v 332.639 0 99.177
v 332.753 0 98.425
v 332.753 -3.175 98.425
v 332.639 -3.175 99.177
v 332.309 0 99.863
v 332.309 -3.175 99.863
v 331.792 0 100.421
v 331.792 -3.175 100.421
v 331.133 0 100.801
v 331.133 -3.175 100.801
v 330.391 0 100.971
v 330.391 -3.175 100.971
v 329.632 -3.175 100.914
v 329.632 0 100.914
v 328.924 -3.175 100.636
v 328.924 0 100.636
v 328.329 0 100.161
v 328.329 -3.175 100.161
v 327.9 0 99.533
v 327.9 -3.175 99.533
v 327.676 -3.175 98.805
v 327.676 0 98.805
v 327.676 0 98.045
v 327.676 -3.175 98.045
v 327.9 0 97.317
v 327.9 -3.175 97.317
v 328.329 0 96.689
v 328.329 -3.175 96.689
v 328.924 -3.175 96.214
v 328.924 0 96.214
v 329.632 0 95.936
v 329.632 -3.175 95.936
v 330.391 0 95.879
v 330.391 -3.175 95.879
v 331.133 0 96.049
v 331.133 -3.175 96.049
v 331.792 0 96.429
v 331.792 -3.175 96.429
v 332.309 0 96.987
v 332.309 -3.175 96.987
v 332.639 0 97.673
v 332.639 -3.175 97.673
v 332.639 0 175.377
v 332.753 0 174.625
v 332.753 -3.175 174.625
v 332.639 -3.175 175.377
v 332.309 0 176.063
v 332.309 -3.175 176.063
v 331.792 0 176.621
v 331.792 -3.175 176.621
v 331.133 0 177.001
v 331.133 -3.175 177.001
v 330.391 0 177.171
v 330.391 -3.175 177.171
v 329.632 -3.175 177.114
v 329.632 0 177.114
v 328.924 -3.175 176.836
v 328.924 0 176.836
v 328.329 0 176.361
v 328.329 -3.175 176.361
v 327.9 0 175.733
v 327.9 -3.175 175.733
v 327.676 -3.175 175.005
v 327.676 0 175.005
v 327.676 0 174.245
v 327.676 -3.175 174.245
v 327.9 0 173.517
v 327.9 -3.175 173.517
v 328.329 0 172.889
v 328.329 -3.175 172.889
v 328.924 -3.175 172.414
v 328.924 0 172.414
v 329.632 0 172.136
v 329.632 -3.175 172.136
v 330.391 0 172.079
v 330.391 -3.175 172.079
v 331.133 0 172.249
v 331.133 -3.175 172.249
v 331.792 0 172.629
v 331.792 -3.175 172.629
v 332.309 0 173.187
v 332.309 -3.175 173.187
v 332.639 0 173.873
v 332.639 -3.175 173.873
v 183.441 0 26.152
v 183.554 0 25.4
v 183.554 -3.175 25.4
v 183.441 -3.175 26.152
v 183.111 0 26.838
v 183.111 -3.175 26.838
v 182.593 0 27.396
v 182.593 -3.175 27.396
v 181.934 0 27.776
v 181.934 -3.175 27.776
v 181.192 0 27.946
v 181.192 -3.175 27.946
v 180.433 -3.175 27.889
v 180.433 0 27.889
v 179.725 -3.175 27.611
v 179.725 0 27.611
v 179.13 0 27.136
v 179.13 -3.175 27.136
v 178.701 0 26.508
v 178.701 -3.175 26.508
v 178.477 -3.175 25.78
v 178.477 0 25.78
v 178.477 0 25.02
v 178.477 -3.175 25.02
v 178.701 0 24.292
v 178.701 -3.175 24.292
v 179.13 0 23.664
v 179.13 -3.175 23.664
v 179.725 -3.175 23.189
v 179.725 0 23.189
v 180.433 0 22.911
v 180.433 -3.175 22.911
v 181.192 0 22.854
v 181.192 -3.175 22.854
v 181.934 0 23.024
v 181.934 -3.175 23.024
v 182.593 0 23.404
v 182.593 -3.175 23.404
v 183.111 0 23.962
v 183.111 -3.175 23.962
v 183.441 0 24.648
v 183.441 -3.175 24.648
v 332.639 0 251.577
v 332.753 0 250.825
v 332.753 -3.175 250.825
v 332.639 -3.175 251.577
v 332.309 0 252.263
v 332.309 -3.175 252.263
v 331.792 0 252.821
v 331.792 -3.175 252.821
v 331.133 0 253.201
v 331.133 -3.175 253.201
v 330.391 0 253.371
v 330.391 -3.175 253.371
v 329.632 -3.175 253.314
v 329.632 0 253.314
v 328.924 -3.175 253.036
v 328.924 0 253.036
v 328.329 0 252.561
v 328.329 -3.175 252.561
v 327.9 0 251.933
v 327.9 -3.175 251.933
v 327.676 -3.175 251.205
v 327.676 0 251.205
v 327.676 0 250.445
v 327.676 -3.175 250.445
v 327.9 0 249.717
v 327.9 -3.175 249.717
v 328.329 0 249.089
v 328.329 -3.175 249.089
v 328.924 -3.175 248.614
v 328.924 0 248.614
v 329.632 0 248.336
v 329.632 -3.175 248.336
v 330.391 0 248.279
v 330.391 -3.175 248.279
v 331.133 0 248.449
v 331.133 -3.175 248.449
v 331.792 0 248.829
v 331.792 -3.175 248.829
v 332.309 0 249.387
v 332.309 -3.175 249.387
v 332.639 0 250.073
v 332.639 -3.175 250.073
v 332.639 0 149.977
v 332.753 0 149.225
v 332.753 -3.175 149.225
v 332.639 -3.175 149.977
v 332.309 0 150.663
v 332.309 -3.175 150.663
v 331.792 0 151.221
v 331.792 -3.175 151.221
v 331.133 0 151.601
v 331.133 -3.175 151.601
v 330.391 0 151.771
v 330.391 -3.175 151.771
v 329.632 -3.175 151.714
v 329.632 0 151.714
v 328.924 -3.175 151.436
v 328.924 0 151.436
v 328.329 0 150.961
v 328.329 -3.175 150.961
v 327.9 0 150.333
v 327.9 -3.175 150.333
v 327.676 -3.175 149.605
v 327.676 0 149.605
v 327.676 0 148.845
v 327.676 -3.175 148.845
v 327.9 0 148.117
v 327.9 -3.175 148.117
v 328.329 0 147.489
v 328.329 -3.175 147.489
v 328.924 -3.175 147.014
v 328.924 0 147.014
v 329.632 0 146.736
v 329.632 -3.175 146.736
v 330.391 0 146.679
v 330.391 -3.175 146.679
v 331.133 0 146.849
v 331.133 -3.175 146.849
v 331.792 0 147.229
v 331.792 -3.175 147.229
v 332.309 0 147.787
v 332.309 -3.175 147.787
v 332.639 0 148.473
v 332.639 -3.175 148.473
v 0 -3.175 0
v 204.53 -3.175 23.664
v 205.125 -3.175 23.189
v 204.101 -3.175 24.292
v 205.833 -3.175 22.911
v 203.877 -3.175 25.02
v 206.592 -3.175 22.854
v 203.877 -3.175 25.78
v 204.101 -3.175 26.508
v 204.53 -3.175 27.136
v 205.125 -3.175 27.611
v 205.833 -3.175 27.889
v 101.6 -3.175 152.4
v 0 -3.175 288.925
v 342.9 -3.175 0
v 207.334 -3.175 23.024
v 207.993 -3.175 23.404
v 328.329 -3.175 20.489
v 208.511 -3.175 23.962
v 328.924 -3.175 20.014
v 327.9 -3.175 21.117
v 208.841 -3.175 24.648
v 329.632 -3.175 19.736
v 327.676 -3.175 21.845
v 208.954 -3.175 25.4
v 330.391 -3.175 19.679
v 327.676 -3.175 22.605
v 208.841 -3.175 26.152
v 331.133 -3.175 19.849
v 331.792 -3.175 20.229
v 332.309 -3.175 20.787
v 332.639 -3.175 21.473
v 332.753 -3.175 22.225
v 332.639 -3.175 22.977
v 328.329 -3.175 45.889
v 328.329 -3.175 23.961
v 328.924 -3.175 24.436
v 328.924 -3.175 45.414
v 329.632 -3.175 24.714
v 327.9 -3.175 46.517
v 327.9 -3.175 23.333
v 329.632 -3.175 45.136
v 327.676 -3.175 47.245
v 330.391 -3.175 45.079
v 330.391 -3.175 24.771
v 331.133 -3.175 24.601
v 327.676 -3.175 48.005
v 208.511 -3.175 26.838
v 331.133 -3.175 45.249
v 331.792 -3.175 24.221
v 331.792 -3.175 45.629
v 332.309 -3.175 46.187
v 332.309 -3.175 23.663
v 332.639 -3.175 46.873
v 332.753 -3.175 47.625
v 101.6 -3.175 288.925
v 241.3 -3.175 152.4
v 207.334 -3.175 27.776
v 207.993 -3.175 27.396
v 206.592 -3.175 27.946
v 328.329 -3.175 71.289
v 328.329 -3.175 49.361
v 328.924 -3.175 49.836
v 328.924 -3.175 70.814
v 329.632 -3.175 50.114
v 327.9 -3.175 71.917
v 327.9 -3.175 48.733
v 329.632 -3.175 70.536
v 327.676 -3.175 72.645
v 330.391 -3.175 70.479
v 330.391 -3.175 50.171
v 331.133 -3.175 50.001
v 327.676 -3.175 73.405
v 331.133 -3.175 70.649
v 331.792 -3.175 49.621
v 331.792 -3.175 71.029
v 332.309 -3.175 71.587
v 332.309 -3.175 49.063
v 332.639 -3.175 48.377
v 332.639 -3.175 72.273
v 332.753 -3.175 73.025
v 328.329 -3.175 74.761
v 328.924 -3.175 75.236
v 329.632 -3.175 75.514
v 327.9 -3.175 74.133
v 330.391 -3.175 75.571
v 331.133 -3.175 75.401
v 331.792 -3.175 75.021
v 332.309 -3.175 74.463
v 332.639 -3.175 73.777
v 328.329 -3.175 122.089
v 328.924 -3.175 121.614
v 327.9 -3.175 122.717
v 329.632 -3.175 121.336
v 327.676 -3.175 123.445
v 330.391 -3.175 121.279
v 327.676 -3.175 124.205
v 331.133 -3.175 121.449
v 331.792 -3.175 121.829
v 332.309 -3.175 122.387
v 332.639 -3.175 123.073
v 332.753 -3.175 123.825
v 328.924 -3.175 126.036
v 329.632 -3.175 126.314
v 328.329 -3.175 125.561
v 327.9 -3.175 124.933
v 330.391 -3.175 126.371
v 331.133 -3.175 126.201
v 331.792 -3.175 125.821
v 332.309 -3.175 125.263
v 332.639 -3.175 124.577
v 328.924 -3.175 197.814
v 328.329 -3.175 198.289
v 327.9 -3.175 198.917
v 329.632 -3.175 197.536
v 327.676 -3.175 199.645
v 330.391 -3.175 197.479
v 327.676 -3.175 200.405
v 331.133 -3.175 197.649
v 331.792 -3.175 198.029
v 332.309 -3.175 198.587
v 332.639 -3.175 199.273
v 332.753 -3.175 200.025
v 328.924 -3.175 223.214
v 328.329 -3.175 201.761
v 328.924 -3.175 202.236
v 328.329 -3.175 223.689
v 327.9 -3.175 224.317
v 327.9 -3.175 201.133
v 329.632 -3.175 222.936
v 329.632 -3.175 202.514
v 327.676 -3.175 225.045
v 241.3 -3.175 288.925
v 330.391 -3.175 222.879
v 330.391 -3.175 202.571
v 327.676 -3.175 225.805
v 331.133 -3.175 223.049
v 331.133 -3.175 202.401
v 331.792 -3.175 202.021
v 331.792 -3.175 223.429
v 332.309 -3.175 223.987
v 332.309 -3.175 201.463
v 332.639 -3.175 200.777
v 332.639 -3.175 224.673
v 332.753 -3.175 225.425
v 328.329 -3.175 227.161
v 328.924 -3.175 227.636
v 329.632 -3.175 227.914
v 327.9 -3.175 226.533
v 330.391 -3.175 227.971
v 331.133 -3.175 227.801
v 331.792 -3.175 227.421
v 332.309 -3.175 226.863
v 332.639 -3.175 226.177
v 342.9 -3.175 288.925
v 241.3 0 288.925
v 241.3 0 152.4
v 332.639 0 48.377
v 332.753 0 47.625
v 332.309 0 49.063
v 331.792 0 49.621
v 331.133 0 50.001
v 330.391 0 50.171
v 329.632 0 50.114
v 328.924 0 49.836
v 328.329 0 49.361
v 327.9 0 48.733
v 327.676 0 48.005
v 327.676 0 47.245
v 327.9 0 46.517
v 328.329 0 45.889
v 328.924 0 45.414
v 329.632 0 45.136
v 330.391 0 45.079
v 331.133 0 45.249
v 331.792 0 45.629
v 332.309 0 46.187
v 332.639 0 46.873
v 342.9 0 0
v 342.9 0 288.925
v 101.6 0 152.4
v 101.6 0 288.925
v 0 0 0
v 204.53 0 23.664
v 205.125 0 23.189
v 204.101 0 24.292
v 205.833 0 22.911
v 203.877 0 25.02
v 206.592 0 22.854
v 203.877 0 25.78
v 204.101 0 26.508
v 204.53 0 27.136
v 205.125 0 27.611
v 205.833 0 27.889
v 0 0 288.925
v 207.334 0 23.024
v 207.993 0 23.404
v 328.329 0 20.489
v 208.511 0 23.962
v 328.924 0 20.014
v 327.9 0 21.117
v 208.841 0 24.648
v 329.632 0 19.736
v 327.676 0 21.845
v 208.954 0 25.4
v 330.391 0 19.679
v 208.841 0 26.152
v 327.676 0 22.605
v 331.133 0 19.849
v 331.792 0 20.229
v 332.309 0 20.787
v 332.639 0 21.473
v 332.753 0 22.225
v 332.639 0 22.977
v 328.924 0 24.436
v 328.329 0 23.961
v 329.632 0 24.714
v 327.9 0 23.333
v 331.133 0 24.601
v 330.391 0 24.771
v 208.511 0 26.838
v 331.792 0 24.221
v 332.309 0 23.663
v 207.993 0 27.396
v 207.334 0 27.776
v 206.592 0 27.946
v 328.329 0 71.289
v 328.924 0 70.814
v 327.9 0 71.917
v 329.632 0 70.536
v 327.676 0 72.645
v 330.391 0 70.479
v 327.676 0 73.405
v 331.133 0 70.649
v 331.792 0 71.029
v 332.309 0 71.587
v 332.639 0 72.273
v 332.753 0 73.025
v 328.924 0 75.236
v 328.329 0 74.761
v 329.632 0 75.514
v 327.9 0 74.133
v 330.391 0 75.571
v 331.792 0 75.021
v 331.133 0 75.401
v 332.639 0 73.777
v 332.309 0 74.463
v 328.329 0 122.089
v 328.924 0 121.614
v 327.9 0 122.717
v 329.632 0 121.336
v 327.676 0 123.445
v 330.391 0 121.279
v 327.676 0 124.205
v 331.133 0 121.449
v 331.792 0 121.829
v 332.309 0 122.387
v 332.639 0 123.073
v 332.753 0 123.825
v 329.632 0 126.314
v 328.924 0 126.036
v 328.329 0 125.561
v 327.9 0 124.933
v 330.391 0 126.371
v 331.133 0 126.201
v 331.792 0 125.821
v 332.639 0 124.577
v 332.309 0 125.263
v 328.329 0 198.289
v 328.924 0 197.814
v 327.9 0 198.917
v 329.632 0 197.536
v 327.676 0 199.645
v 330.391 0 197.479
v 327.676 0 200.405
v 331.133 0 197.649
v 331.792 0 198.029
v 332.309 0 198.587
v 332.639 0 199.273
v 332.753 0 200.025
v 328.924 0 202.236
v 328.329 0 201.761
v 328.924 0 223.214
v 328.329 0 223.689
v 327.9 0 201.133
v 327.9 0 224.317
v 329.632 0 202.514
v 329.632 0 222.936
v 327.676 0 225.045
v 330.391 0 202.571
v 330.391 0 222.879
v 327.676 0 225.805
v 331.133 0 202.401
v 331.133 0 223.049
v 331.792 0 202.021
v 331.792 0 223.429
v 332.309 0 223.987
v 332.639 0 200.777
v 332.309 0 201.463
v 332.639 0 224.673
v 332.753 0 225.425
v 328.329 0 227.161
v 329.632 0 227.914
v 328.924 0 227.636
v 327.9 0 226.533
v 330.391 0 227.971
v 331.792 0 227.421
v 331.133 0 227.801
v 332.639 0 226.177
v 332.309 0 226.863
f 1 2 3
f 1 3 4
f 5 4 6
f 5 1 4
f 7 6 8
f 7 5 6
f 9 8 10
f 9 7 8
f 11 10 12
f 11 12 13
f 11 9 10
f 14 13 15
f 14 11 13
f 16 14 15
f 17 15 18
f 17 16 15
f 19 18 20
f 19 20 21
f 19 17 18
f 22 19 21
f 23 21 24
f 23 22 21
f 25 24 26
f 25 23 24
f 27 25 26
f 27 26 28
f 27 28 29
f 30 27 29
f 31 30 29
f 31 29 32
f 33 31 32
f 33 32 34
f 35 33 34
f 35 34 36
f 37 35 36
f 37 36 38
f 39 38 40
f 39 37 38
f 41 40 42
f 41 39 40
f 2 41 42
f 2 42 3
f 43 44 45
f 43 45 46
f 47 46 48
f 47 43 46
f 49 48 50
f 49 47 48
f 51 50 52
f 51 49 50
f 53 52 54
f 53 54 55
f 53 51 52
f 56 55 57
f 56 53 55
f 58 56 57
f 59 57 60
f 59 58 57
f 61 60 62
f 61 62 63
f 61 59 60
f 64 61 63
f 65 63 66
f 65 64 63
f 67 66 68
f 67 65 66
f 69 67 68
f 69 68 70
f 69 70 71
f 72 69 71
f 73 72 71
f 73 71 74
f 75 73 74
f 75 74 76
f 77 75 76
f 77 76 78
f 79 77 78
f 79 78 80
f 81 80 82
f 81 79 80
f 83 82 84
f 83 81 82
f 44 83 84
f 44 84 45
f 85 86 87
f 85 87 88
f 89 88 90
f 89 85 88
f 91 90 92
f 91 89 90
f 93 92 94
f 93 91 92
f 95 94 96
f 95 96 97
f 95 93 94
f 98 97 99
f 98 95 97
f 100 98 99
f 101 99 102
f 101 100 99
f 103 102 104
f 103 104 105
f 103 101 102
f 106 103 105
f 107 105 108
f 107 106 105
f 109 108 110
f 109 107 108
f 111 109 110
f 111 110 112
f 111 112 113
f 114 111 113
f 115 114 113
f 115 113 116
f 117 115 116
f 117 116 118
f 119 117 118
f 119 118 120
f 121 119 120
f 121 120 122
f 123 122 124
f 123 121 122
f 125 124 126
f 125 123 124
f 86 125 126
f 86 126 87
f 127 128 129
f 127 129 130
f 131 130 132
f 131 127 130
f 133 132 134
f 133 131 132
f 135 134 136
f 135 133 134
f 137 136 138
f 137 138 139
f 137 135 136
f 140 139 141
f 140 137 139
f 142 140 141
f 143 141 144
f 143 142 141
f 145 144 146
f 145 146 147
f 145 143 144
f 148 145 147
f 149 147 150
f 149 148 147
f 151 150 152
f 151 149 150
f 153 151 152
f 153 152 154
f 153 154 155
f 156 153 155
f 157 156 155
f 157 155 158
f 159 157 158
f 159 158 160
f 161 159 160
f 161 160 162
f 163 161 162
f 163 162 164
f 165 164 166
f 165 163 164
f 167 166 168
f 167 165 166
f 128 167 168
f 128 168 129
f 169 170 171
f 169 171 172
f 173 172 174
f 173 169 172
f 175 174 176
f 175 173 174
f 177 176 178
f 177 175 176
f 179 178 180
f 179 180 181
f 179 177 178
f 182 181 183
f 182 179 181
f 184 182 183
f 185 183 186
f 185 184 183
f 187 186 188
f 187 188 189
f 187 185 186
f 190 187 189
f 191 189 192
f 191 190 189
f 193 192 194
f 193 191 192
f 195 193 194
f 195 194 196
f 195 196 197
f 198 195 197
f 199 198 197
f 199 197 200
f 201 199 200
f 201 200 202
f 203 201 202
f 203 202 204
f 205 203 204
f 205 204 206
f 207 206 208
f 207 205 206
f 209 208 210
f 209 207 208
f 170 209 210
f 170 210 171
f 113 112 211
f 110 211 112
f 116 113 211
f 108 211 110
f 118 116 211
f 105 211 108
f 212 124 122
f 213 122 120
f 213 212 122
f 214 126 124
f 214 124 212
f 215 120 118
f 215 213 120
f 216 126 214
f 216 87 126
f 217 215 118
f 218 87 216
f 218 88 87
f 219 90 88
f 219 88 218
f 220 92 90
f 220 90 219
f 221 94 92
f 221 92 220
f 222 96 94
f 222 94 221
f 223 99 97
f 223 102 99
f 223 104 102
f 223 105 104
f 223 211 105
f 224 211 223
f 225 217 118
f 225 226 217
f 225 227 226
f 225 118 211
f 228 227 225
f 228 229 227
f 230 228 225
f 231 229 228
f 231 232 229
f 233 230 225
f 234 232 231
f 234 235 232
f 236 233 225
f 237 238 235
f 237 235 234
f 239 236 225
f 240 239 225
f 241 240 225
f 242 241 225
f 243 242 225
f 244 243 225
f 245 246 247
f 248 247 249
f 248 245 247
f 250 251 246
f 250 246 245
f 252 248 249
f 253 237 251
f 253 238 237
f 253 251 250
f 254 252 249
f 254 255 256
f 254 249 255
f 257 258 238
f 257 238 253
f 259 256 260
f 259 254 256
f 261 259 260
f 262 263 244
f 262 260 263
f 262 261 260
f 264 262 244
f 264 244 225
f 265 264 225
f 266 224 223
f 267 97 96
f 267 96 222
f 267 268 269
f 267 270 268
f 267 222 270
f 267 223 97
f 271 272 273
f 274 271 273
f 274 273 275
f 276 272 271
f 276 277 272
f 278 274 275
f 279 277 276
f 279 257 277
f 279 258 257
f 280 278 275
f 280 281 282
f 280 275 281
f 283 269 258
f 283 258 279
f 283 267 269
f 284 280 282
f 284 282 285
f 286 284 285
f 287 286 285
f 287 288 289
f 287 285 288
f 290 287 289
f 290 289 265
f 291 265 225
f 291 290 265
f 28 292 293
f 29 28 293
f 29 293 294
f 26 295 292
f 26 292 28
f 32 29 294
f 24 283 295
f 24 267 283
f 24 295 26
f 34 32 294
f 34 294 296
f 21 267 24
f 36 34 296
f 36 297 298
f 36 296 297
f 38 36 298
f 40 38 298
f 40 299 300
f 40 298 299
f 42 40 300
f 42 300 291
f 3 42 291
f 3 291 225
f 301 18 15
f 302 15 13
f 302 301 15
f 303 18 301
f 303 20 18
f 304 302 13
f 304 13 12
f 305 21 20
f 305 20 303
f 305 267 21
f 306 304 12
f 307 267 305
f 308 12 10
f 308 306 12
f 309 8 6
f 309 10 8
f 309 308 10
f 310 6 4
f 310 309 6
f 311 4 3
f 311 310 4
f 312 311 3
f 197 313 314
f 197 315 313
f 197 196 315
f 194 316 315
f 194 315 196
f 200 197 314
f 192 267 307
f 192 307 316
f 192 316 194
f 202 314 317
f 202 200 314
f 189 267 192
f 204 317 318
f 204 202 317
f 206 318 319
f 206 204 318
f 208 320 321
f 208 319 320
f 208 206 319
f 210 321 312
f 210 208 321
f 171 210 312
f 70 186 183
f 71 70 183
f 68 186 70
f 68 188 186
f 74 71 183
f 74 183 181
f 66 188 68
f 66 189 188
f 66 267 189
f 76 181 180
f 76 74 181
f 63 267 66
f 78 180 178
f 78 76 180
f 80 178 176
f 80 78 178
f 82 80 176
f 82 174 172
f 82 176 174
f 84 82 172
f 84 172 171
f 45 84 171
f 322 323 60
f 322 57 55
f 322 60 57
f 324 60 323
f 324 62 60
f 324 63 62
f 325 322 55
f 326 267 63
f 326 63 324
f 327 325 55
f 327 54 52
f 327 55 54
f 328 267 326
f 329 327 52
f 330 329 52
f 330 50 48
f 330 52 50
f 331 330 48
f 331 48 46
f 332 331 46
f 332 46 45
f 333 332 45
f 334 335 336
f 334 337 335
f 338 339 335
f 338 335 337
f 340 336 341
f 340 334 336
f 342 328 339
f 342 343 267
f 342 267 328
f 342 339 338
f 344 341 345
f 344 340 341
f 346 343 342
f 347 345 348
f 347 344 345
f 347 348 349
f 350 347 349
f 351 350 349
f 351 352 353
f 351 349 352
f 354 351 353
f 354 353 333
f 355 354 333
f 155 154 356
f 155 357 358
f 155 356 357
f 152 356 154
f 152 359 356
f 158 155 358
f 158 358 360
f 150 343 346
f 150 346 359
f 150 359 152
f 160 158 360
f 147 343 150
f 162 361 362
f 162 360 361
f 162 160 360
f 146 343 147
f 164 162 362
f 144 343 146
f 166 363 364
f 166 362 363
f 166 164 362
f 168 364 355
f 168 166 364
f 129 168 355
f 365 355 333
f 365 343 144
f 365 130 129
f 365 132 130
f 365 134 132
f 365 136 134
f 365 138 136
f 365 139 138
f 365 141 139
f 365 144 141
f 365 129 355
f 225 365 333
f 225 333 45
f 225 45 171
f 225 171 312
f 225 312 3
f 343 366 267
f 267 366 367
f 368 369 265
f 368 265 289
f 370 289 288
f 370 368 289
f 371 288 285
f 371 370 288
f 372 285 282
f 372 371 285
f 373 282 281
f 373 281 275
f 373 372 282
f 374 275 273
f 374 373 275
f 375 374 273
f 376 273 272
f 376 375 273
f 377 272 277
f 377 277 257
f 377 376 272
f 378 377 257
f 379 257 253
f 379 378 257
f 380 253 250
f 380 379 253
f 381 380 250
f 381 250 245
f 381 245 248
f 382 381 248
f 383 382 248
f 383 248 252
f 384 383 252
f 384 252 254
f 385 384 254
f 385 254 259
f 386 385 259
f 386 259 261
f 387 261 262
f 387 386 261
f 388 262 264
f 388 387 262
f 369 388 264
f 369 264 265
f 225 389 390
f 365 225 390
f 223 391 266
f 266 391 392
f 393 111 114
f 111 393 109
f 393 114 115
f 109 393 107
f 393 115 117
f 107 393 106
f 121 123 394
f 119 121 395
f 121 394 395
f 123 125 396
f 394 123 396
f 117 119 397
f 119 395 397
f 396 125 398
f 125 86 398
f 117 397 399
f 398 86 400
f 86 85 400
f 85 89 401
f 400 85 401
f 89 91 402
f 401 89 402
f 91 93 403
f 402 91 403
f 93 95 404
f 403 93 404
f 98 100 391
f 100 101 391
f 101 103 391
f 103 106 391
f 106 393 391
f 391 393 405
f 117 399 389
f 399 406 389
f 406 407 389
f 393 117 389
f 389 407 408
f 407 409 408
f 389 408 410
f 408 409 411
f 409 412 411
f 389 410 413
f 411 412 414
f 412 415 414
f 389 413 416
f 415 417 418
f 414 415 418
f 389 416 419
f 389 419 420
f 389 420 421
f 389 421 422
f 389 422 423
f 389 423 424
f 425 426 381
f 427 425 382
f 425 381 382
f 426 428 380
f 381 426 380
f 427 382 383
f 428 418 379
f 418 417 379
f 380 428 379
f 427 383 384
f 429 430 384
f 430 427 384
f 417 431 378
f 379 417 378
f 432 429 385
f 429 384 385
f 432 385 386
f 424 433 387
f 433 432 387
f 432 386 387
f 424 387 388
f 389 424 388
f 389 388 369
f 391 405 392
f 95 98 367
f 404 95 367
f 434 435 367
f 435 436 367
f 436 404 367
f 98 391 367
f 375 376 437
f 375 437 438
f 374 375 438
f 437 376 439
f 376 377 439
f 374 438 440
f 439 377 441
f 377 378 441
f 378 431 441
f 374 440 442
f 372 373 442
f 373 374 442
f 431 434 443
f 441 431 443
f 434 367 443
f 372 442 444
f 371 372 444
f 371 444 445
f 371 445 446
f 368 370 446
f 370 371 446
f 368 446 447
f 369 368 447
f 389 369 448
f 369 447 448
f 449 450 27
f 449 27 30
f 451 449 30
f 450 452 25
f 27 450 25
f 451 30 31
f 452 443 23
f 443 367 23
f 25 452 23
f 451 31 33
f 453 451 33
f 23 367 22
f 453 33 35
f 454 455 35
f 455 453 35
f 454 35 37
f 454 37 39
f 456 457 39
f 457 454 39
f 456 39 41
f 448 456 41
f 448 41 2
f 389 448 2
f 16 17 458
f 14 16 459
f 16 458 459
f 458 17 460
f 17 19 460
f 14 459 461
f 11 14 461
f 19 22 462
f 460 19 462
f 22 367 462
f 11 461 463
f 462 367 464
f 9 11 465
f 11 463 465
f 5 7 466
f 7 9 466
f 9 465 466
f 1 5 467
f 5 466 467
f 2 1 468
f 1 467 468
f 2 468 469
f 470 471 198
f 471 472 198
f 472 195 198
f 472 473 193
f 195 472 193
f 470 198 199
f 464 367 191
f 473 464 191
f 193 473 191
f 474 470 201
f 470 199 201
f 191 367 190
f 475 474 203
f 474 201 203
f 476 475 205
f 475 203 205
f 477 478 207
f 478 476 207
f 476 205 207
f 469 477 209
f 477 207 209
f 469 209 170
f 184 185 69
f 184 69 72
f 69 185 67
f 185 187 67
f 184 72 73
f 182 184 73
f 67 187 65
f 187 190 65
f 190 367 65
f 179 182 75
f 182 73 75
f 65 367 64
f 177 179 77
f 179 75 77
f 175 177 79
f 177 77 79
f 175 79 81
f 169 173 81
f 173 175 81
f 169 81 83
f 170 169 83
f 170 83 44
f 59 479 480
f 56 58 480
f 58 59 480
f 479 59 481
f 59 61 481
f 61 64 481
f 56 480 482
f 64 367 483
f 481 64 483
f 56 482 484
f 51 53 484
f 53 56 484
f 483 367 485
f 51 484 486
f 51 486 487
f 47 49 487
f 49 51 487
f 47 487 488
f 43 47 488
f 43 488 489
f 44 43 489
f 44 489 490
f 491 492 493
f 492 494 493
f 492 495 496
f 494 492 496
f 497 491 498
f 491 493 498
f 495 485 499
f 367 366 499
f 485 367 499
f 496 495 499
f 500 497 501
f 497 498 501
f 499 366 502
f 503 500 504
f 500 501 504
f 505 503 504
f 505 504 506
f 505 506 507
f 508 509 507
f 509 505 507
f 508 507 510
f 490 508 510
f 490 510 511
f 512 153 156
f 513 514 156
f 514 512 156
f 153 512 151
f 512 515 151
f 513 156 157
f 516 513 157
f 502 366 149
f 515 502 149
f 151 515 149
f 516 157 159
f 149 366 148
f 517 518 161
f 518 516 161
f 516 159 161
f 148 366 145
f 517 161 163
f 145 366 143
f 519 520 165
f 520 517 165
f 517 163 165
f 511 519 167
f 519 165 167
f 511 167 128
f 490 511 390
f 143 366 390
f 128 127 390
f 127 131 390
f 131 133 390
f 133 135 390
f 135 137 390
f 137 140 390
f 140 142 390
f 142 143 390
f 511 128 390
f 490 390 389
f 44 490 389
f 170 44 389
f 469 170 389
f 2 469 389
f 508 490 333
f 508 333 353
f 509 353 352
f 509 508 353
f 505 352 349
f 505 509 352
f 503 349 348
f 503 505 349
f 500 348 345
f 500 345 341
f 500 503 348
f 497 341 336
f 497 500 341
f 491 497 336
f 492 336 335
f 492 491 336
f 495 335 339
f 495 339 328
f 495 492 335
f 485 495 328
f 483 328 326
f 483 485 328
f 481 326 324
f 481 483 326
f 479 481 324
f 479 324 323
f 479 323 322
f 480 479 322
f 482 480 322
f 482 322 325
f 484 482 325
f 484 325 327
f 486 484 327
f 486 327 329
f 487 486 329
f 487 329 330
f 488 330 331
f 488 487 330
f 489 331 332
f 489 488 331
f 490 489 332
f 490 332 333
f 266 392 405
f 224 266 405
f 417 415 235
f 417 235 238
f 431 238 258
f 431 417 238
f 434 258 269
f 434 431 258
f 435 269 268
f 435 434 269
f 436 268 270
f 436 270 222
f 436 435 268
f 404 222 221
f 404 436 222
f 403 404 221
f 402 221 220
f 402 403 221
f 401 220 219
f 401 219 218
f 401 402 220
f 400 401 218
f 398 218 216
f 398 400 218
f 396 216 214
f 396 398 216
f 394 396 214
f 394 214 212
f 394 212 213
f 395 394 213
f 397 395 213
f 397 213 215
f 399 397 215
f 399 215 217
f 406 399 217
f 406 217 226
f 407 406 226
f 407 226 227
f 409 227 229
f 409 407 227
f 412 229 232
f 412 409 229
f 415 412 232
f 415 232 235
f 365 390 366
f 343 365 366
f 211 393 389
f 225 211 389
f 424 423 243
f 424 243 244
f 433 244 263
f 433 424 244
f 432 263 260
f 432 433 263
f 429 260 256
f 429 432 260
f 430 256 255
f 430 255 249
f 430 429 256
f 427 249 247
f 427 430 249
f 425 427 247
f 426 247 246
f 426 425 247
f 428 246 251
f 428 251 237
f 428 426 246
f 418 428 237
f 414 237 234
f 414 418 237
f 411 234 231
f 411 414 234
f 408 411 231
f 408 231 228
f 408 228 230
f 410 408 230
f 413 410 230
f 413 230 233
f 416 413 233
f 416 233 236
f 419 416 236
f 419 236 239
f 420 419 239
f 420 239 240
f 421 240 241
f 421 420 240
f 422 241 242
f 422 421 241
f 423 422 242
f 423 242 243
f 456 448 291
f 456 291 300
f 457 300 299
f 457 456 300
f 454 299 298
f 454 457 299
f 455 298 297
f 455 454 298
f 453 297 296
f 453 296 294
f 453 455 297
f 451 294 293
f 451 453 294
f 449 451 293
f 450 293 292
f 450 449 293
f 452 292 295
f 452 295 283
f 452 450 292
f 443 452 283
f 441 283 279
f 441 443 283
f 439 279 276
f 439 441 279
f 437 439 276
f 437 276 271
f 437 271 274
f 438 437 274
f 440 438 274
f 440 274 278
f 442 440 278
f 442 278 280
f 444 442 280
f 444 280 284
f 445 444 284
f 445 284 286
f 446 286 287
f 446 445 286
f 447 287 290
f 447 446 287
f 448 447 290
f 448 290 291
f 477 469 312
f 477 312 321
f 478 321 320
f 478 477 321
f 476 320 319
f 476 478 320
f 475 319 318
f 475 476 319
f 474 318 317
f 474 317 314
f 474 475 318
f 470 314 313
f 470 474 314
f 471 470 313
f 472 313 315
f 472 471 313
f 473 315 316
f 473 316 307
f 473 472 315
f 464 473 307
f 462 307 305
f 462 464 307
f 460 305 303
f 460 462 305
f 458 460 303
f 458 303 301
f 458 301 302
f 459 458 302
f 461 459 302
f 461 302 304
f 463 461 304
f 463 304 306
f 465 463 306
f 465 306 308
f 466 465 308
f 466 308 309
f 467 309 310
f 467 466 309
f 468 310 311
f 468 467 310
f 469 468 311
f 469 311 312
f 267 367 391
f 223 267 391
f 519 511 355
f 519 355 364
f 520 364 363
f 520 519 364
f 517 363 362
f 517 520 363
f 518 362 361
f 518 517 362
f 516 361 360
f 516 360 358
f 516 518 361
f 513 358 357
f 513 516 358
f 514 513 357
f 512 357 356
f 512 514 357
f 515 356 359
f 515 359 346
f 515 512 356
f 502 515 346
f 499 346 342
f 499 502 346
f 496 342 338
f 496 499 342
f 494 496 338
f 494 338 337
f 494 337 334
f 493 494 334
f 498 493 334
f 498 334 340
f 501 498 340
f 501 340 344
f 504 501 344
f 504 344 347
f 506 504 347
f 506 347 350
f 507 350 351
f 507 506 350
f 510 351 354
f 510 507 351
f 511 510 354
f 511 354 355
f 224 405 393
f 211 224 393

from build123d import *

# Parameters (mm, degrees)
F0_R     = 2.5527
F1_DEPTH = 3.175


with BuildPart() as f1:
    # F0 (on Front) → F1 (new body)
    with BuildSketch(Plane.XZ):
        Polygon((0, 288.925), (0, 0), (342.9, 0), (342.9, 288.925), (241.3, 288.925), (241.3, 152.4), (101.6, 152.4), (101.6, 288.925), align=None)
        with Locations((181.0013651848, 25.4)):
            Circle(F0_R, mode=Mode.SUBTRACT)
        with Locations((206.4013651848, 25.4)):
            Circle(F0_R, mode=Mode.SUBTRACT)
        with Locations((330.2, 22.225)):
            Circle(F0_R, mode=Mode.SUBTRACT)
        with Locations((330.2, 47.625)):
            Circle(F0_R, mode=Mode.SUBTRACT)
        with Locations((330.2, 73.025)):
            Circle(F0_R, mode=Mode.SUBTRACT)
        with Locations((330.2, 98.425)):
            Circle(F0_R, mode=Mode.SUBTRACT)
        with Locations((330.2, 123.825)):
            Circle(F0_R, mode=Mode.SUBTRACT)
        with Locations((330.2, 149.225)):
            Circle(F0_R, mode=Mode.SUBTRACT)
        with Locations((330.2, 174.625)):
            Circle(F0_R, mode=Mode.SUBTRACT)
        with Locations((330.2, 200.025)):
            Circle(F0_R, mode=Mode.SUBTRACT)
        with Locations((330.2, 225.425)):
            Circle(F0_R, mode=Mode.SUBTRACT)
        with Locations((330.2, 250.825)):
            Circle(F0_R, mode=Mode.SUBTRACT)
    extrude(amount=F1_DEPTH)


solid = f1.part
